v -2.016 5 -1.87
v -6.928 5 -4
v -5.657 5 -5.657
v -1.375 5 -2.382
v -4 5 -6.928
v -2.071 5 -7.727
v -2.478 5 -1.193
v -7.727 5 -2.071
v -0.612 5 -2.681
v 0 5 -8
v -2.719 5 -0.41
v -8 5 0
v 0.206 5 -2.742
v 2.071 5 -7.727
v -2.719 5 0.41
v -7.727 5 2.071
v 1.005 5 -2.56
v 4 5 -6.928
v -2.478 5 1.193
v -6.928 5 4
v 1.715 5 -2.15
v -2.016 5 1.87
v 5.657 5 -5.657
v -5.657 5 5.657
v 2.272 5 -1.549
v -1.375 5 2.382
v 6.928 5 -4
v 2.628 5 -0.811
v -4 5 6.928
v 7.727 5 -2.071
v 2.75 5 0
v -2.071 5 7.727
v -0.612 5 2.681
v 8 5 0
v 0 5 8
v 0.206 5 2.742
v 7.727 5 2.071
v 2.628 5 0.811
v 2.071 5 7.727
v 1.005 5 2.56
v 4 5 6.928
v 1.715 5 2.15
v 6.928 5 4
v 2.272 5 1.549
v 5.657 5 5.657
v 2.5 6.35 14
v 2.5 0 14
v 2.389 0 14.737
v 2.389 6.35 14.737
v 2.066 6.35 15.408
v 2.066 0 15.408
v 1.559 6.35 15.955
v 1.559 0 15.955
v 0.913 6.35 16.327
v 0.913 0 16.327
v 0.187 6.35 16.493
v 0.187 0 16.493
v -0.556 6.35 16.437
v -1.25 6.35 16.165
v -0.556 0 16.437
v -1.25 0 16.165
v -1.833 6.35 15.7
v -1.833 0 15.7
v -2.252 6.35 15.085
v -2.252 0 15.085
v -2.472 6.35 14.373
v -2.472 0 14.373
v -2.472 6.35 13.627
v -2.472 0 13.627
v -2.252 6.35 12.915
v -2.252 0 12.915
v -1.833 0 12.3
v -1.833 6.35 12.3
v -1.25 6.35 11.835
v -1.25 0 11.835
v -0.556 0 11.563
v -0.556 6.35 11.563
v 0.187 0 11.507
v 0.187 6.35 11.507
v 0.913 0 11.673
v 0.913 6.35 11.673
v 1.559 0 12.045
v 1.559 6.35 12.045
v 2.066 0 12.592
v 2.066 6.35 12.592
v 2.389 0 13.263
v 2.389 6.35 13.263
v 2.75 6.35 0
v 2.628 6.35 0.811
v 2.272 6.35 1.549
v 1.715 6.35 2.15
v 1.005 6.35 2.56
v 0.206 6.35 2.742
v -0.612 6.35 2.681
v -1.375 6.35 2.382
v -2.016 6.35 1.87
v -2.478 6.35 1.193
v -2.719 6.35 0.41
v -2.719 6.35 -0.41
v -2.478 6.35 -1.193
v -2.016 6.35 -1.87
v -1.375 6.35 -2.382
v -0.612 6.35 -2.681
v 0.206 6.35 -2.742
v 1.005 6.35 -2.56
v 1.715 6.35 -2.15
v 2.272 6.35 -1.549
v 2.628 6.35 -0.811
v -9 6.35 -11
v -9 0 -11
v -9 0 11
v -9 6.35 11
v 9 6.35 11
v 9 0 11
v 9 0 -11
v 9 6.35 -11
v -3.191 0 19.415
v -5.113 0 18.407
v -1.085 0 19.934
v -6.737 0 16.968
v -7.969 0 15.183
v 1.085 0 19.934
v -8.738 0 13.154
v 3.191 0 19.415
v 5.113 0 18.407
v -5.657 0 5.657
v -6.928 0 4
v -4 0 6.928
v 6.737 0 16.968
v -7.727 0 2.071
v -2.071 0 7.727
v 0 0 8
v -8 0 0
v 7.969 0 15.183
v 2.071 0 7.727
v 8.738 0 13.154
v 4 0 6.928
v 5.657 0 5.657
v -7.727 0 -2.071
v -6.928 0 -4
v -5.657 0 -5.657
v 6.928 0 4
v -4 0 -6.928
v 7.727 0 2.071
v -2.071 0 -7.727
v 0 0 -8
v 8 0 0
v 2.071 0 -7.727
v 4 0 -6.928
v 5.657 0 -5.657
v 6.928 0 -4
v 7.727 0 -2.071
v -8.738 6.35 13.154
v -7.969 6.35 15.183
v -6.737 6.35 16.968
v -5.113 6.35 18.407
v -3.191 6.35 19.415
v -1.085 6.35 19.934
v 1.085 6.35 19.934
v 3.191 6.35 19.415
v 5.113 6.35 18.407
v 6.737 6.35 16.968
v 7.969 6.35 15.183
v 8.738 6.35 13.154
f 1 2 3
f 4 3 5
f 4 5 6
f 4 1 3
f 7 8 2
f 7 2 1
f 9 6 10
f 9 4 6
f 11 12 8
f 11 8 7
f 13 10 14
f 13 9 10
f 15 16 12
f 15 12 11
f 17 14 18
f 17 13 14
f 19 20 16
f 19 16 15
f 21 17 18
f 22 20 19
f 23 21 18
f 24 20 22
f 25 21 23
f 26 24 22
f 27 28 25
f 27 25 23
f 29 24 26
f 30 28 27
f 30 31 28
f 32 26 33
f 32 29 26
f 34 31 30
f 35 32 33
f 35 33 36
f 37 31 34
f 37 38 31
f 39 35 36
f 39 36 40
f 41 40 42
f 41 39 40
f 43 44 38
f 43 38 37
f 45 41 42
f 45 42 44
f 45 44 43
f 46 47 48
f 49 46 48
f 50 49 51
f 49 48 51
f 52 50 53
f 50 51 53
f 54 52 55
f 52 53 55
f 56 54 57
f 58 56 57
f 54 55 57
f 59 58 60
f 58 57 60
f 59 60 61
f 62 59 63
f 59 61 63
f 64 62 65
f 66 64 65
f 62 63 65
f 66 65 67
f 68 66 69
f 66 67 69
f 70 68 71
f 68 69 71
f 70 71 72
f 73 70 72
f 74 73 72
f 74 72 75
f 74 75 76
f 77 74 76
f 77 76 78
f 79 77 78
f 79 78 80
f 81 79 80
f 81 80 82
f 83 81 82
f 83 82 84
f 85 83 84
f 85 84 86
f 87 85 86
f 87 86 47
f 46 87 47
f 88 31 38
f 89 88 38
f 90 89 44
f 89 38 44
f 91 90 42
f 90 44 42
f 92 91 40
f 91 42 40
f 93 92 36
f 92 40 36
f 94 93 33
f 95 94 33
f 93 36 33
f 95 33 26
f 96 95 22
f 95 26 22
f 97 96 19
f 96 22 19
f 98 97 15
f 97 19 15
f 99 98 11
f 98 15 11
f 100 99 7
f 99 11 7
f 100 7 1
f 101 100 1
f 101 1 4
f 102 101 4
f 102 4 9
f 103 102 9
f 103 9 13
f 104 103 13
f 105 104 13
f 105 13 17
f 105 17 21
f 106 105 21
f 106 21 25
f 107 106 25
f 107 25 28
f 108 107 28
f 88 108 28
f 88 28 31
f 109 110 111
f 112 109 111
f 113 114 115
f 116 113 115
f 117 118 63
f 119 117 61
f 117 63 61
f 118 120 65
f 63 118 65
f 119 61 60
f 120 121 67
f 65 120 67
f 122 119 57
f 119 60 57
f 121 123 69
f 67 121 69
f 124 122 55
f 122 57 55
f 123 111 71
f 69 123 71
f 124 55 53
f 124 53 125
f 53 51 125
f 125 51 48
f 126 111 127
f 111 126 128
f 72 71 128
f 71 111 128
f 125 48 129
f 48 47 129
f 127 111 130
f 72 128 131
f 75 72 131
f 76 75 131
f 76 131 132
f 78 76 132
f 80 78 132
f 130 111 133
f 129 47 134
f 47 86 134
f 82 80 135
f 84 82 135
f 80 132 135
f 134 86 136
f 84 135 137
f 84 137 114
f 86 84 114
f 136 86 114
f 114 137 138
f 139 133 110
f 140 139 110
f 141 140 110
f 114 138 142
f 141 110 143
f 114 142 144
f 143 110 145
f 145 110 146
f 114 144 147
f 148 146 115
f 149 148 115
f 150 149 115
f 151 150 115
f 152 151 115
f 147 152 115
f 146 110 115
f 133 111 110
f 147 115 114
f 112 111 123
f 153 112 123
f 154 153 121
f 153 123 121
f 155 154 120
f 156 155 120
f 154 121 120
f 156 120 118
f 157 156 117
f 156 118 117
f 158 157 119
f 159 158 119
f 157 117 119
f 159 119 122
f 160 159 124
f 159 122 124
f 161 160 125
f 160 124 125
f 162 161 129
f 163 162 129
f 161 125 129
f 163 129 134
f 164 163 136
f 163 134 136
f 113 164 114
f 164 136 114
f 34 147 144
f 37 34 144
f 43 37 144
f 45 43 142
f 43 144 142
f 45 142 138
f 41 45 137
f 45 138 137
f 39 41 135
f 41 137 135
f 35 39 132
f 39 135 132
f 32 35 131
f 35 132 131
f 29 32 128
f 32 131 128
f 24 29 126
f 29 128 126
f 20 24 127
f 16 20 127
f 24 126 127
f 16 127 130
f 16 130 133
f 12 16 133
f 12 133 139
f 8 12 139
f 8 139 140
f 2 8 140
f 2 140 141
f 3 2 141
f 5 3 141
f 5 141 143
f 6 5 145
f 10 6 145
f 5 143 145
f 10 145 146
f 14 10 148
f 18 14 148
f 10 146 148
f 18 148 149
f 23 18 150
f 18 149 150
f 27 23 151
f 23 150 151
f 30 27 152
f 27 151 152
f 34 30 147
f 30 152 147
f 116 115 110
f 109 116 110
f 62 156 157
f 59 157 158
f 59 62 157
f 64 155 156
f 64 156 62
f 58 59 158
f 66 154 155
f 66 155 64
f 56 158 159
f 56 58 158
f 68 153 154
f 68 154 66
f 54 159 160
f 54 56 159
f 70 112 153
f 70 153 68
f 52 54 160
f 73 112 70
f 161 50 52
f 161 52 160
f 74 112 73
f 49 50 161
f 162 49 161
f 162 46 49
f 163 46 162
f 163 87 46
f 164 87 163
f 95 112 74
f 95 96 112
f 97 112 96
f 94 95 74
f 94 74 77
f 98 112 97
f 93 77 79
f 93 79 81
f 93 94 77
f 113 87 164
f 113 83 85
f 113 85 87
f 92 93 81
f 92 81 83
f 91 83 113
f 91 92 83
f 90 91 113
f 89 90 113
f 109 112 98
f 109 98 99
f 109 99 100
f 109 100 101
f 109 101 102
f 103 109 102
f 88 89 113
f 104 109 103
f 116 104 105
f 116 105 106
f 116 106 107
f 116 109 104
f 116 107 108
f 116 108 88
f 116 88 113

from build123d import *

# Parameters (mm, degrees)
BOSS_EXTRUDE1_DEPTH = 6.35
SKETCH2_R           = 8
CUT_EXTRUDE1_DEPTH  = 5
SKETCH3_R           = 2.75
CUT_EXTRUDE2_DEPTH  = 2.35
SKETCH4_R           = 2.5
CUT_EXTRUDE3_DEPTH  = 7.35


with BuildPart() as part:
    # Sketch1 → Boss-Extrude1 (new body)
    with BuildSketch(Plane(origin=(0, 0, 0), x_dir=(1, 0, 0), z_dir=(0, 1, 0))):
        with BuildLine():
            Line((9, 11), (-9, 11))
            Line((-9, 11), (-9, -11))
            ThreePointArc((-9, -11), (0, -20), (9, -11))
            Line((9, -11), (9, 11))
        make_face()
    extrude(amount=BOSS_EXTRUDE1_DEPTH)

    # Sketch2 → Cut-Extrude1 (cut)
    with BuildSketch(Plane.XZ):
        Circle(SKETCH2_R)
    extrude(amount=-CUT_EXTRUDE1_DEPTH, mode=Mode.SUBTRACT)

    # Sketch3 → Cut-Extrude2 (cut, through all)
    with BuildSketch(Plane.XZ.offset(-5)):
        Circle(SKETCH3_R)
    extrude(amount=-CUT_EXTRUDE2_DEPTH, mode=Mode.SUBTRACT)

    # Sketch4 → Cut-Extrude3 (cut, through all)
    with BuildSketch(Plane.XZ):
        with Locations((0, 14)):
            Circle(SKETCH4_R)
        with Locations((0, -13.5)):
            Circle(SKETCH4_R)
    extrude(amount=-CUT_EXTRUDE3_DEPTH, mode=Mode.SUBTRACT)


solid = part.part
